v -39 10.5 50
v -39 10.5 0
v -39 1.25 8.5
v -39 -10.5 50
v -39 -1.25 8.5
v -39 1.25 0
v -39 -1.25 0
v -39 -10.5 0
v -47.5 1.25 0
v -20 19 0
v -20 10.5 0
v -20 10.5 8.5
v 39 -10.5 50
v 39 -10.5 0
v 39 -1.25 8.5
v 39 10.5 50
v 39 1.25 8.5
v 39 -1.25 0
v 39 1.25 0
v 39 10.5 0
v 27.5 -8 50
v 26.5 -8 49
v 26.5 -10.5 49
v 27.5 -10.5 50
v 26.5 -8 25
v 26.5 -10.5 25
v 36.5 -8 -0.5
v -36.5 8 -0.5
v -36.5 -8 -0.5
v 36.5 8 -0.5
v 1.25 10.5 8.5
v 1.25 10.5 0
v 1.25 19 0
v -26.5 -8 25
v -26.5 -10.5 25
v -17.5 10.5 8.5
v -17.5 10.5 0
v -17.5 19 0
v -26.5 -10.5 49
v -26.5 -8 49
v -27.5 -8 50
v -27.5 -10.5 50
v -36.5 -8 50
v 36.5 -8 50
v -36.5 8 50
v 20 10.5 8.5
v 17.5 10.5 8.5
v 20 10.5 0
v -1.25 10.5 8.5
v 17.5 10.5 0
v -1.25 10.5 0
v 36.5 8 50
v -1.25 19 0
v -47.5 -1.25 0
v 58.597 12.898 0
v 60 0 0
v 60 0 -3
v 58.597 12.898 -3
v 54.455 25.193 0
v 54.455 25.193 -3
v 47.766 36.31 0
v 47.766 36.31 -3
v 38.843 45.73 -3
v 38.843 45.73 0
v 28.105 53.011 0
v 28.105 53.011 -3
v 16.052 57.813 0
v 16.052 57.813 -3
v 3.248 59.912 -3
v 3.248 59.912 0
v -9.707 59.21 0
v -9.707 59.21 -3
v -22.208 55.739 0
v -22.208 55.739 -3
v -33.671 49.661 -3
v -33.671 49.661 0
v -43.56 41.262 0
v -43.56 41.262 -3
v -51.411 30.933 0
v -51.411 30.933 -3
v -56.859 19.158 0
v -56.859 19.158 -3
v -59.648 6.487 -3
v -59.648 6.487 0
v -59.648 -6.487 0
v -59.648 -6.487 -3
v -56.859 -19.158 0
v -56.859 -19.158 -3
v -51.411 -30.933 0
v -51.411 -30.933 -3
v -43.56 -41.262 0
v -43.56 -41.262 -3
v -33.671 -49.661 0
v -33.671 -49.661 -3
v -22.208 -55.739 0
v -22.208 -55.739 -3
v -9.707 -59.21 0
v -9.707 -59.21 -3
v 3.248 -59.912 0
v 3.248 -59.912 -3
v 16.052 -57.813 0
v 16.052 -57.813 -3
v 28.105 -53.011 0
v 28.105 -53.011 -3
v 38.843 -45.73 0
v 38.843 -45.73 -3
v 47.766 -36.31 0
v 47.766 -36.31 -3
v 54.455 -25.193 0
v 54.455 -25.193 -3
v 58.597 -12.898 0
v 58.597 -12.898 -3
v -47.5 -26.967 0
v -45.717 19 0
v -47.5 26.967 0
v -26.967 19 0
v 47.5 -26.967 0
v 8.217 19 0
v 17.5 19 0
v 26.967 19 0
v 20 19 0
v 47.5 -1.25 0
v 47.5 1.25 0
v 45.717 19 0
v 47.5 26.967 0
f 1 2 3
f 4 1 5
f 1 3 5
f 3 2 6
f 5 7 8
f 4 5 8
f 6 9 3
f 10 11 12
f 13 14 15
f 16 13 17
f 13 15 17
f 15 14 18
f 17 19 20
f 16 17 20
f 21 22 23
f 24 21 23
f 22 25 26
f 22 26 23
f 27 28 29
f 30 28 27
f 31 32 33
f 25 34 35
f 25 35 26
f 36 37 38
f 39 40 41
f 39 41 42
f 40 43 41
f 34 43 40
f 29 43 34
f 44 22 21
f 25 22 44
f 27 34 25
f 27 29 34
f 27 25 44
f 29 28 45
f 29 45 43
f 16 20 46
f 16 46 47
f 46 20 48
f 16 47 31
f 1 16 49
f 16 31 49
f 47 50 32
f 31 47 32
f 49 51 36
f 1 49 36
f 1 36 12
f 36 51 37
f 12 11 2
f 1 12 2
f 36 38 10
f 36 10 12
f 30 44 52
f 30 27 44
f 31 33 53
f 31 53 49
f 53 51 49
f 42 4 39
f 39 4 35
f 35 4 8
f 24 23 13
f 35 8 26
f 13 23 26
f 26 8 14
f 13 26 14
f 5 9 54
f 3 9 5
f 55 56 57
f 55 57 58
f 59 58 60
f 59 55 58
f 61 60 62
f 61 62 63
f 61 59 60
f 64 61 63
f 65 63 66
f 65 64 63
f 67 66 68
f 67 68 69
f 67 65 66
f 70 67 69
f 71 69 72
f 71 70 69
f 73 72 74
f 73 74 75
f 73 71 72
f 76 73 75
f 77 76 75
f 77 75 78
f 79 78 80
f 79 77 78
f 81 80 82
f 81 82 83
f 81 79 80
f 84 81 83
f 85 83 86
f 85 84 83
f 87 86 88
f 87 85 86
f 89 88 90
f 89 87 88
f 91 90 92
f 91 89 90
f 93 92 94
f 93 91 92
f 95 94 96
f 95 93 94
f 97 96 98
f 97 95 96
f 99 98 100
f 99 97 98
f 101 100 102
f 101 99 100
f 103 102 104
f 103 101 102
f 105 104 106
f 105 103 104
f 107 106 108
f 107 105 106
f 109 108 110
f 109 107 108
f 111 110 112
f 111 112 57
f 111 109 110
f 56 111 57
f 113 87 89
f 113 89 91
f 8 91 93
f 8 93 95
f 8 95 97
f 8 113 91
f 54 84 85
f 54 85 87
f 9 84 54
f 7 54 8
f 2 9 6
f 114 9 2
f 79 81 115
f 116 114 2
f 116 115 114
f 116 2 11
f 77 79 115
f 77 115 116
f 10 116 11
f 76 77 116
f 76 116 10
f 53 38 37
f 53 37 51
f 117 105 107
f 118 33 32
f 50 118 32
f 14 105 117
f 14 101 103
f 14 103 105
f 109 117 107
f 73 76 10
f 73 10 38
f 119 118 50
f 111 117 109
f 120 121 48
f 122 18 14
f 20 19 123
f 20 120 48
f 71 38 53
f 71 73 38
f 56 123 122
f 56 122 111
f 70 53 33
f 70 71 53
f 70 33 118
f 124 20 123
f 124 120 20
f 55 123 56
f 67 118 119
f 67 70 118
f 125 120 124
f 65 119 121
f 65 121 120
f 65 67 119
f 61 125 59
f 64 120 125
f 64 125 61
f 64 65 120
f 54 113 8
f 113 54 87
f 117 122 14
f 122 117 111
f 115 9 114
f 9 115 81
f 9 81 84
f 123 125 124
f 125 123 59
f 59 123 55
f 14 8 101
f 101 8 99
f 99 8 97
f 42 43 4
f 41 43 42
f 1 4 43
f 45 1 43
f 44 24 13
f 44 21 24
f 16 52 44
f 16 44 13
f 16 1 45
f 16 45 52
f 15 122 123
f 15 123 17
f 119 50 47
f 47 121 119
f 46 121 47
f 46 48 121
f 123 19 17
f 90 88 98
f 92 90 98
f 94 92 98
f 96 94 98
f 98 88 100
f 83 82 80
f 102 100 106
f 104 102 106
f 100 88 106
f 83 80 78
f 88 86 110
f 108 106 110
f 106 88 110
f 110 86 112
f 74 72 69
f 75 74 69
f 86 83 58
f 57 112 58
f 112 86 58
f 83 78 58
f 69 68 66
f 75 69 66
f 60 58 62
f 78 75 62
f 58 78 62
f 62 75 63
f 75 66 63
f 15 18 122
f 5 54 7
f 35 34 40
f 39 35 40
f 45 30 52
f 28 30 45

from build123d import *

# Parameters (mm, degrees)
F0_R         = 60
F0_W         = 8.5
F0_H         = 2.5
F0_W_2       = 2.5
F0_H_2       = 8.5
F2_DEPTH     = 3
F3_DEPTH     = 50
F4_T         = -2.5
F5_DEPTH     = 10
F6_T4_DEPTH  = 53.9336597593
F6_T10_DEPTH = 53.9336597593
F6_T16_DEPTH = 53.9336597593
F6_T22_DEPTH = 53.9336597593
F6_T28_DEPTH = 53.9336597593
F1_W         = 53
F1_H         = 50
F7_DEPTH     = 25
F8_SIZE      = 1


# Not quite as in the source:
# - a fillet or chamfer that OpenCascade refuses, or shapes differently, is made with other operations: its cross-section is extruded or revolved along the edge and cut away or added


with BuildPart() as f2:
    # F0 (on Top) → F2 (new body)
    with BuildSketch(Plane.XY):
        Circle(F0_R)
        Polygon((20, 10.5), (39, 10.5), (39, 1.25), (47.5, 1.25), (47.5, -1.25), (39, -1.25), (39, -10.5), (-39, -10.5), (-39, -1.25), (-47.5, -1.25), (-47.5, 1.25), (-39, 1.25), (-39, 10.5), (-20, 10.5), (-20, 19), (-17.5, 19), (-17.5, 10.5), (-1.25, 10.5), (-1.25, 19), (1.25, 19), (1.25, 10.5), (17.5, 10.5), (17.5, 19), (20, 19), align=None, mode=Mode.SUBTRACT)
        Polygon((39, 1.25), (39, 10.5), (20, 10.5), (17.5, 10.5), (1.25, 10.5), (-1.25, 10.5), (-17.5, 10.5), (-20, 10.5), (-39, 10.5), (-39, 1.25), (-39, -1.25), (-39, -10.5), (39, -10.5), (39, -1.25), align=None)
        with Locations((-43.25, 0)):
            Rectangle(F0_W, F0_H)
        with Locations((-18.75, 14.75)):
            Rectangle(F0_W_2, F0_H_2)
        with Locations((0, 14.75)):
            Rectangle(F0_W_2, F0_H_2)
        with Locations((18.75, 14.75)):
            Rectangle(F0_W_2, F0_H_2)
        with Locations((43.25, 0)):
            Rectangle(F0_W, F0_H)
    extrude(amount=-F2_DEPTH)

    # F0 (on Top) → F3 (join)
    with BuildSketch(Plane.XY):
        Polygon((39, 1.25), (39, 10.5), (20, 10.5), (17.5, 10.5), (1.25, 10.5), (-1.25, 10.5), (-17.5, 10.5), (-20, 10.5), (-39, 10.5), (-39, 1.25), (-39, -1.25), (-39, -10.5), (39, -10.5), (39, -1.25), align=None)
    extrude(amount=F3_DEPTH)

    # F4
    f4_openings = [f2.faces().sort_by_distance(p)[0] for p in [
        (0, 0, 50),
    ]]
    offset(amount=F4_T, openings=f4_openings, kind=Kind.INTERSECTION)

    # F0 (on Top) → F5 (join)
    with BuildSketch(Plane.XY):
        with Locations((18.75, 14.75)):
            Rectangle(F0_W_2, F0_H_2)
        with Locations((43.25, 0)):
            Rectangle(F0_W, F0_H)
        with Locations((0, 14.75)):
            Rectangle(F0_W_2, F0_H_2)
        with Locations((-18.75, 14.75)):
            Rectangle(F0_W_2, F0_H_2)
        with Locations((-43.25, 0)):
            Rectangle(F0_W, F0_H)
    extrude(amount=F5_DEPTH)

    # F6: chamfer of 10 on 5 edges, made by hand


with BuildPart() as f6_tool2:
    # F6_s3 → F6_t4 (new body)
    with BuildSketch(Plane.XZ.offset(26.9668298797)):
        Polygon((47.5, 0), (37.5, 10), (47.5, 10), align=None)
    extrude(amount=-F6_T4_DEPTH)

    split(bisect_by=Plane.XY, keep=Keep.TOP)

    split(bisect_by=Plane.YZ.offset(39), keep=Keep.TOP)


with BuildPart() as f2_1:
    add(f2.part)

    # F6_t1: cut F6_tool2
    add(f6_tool2.part, mode=Mode.SUBTRACT)


with BuildPart() as f6_tool8:
    # F6_s9 → F6_t10 (new body)
    with BuildSketch(Plane.YZ.offset(45.7168298797)):
        Polygon((19, 0), (9, 10), (19, 10), align=None)
    extrude(amount=-F6_T10_DEPTH)

    split(bisect_by=Plane.XY, keep=Keep.TOP)

    split(bisect_by=Plane.XZ.offset(-10.5), keep=Keep.BOTTOM)


with BuildPart() as f2_2:
    add(f2_1.part)

    # F6_t7: cut F6_tool8
    add(f6_tool8.part, mode=Mode.SUBTRACT)


with BuildPart() as f6_tool14:
    # F6_s15 → F6_t16 (new body)
    with BuildSketch(Plane.YZ.offset(26.9668298797)):
        Polygon((19, 0), (9, 10), (19, 10), align=None)
    extrude(amount=-F6_T16_DEPTH)

    split(bisect_by=Plane.XY, keep=Keep.TOP)

    split(bisect_by=Plane.XZ.offset(-10.5), keep=Keep.BOTTOM)


with BuildPart() as f2_3:
    add(f2_2.part)

    # F6_t13: cut F6_tool14
    add(f6_tool14.part, mode=Mode.SUBTRACT)


with BuildPart() as f6_tool20:
    # F6_s21 → F6_t22 (new body)
    with BuildSketch(Plane.YZ.offset(8.2168298797)):
        Polygon((19, 0), (9, 10), (19, 10), align=None)
    extrude(amount=-F6_T22_DEPTH)

    split(bisect_by=Plane.XY, keep=Keep.TOP)

    split(bisect_by=Plane.XZ.offset(-10.5), keep=Keep.BOTTOM)


with BuildPart() as f2_4:
    add(f2_3.part)

    # F6_t19: cut F6_tool20
    add(f6_tool20.part, mode=Mode.SUBTRACT)


with BuildPart() as f6_tool26:
    # F6_s27 → F6_t28 (new body)
    with BuildSketch(Plane.XZ.offset(-26.9668298797)):
        Polygon((-47.5, 0), (-37.5, 10), (-47.5, 10), align=None)
    extrude(amount=F6_T28_DEPTH)

    split(bisect_by=Plane.XY, keep=Keep.TOP)

    split(bisect_by=Plane.YZ.offset(-39), keep=Keep.BOTTOM)


with BuildPart() as f2_5:
    add(f2_4.part)

    # F6_t25: cut F6_tool26
    add(f6_tool26.part, mode=Mode.SUBTRACT)

    # F1 (on Front) → F7 (cut)
    with BuildSketch(Plane.XZ):
        with Locations((0, 50)):
            Rectangle(F1_W, F1_H)
    extrude(amount=F7_DEPTH, mode=Mode.SUBTRACT)

    # F8
    f8_edges = [f2_5.edges().sort_by_distance(p)[0] for p in [
        (-26.5, -9.25, 50),
        (26.5, -9.25, 50),
    ]]
    chamfer(f8_edges, length=F8_SIZE)


solid = f2_5.part
